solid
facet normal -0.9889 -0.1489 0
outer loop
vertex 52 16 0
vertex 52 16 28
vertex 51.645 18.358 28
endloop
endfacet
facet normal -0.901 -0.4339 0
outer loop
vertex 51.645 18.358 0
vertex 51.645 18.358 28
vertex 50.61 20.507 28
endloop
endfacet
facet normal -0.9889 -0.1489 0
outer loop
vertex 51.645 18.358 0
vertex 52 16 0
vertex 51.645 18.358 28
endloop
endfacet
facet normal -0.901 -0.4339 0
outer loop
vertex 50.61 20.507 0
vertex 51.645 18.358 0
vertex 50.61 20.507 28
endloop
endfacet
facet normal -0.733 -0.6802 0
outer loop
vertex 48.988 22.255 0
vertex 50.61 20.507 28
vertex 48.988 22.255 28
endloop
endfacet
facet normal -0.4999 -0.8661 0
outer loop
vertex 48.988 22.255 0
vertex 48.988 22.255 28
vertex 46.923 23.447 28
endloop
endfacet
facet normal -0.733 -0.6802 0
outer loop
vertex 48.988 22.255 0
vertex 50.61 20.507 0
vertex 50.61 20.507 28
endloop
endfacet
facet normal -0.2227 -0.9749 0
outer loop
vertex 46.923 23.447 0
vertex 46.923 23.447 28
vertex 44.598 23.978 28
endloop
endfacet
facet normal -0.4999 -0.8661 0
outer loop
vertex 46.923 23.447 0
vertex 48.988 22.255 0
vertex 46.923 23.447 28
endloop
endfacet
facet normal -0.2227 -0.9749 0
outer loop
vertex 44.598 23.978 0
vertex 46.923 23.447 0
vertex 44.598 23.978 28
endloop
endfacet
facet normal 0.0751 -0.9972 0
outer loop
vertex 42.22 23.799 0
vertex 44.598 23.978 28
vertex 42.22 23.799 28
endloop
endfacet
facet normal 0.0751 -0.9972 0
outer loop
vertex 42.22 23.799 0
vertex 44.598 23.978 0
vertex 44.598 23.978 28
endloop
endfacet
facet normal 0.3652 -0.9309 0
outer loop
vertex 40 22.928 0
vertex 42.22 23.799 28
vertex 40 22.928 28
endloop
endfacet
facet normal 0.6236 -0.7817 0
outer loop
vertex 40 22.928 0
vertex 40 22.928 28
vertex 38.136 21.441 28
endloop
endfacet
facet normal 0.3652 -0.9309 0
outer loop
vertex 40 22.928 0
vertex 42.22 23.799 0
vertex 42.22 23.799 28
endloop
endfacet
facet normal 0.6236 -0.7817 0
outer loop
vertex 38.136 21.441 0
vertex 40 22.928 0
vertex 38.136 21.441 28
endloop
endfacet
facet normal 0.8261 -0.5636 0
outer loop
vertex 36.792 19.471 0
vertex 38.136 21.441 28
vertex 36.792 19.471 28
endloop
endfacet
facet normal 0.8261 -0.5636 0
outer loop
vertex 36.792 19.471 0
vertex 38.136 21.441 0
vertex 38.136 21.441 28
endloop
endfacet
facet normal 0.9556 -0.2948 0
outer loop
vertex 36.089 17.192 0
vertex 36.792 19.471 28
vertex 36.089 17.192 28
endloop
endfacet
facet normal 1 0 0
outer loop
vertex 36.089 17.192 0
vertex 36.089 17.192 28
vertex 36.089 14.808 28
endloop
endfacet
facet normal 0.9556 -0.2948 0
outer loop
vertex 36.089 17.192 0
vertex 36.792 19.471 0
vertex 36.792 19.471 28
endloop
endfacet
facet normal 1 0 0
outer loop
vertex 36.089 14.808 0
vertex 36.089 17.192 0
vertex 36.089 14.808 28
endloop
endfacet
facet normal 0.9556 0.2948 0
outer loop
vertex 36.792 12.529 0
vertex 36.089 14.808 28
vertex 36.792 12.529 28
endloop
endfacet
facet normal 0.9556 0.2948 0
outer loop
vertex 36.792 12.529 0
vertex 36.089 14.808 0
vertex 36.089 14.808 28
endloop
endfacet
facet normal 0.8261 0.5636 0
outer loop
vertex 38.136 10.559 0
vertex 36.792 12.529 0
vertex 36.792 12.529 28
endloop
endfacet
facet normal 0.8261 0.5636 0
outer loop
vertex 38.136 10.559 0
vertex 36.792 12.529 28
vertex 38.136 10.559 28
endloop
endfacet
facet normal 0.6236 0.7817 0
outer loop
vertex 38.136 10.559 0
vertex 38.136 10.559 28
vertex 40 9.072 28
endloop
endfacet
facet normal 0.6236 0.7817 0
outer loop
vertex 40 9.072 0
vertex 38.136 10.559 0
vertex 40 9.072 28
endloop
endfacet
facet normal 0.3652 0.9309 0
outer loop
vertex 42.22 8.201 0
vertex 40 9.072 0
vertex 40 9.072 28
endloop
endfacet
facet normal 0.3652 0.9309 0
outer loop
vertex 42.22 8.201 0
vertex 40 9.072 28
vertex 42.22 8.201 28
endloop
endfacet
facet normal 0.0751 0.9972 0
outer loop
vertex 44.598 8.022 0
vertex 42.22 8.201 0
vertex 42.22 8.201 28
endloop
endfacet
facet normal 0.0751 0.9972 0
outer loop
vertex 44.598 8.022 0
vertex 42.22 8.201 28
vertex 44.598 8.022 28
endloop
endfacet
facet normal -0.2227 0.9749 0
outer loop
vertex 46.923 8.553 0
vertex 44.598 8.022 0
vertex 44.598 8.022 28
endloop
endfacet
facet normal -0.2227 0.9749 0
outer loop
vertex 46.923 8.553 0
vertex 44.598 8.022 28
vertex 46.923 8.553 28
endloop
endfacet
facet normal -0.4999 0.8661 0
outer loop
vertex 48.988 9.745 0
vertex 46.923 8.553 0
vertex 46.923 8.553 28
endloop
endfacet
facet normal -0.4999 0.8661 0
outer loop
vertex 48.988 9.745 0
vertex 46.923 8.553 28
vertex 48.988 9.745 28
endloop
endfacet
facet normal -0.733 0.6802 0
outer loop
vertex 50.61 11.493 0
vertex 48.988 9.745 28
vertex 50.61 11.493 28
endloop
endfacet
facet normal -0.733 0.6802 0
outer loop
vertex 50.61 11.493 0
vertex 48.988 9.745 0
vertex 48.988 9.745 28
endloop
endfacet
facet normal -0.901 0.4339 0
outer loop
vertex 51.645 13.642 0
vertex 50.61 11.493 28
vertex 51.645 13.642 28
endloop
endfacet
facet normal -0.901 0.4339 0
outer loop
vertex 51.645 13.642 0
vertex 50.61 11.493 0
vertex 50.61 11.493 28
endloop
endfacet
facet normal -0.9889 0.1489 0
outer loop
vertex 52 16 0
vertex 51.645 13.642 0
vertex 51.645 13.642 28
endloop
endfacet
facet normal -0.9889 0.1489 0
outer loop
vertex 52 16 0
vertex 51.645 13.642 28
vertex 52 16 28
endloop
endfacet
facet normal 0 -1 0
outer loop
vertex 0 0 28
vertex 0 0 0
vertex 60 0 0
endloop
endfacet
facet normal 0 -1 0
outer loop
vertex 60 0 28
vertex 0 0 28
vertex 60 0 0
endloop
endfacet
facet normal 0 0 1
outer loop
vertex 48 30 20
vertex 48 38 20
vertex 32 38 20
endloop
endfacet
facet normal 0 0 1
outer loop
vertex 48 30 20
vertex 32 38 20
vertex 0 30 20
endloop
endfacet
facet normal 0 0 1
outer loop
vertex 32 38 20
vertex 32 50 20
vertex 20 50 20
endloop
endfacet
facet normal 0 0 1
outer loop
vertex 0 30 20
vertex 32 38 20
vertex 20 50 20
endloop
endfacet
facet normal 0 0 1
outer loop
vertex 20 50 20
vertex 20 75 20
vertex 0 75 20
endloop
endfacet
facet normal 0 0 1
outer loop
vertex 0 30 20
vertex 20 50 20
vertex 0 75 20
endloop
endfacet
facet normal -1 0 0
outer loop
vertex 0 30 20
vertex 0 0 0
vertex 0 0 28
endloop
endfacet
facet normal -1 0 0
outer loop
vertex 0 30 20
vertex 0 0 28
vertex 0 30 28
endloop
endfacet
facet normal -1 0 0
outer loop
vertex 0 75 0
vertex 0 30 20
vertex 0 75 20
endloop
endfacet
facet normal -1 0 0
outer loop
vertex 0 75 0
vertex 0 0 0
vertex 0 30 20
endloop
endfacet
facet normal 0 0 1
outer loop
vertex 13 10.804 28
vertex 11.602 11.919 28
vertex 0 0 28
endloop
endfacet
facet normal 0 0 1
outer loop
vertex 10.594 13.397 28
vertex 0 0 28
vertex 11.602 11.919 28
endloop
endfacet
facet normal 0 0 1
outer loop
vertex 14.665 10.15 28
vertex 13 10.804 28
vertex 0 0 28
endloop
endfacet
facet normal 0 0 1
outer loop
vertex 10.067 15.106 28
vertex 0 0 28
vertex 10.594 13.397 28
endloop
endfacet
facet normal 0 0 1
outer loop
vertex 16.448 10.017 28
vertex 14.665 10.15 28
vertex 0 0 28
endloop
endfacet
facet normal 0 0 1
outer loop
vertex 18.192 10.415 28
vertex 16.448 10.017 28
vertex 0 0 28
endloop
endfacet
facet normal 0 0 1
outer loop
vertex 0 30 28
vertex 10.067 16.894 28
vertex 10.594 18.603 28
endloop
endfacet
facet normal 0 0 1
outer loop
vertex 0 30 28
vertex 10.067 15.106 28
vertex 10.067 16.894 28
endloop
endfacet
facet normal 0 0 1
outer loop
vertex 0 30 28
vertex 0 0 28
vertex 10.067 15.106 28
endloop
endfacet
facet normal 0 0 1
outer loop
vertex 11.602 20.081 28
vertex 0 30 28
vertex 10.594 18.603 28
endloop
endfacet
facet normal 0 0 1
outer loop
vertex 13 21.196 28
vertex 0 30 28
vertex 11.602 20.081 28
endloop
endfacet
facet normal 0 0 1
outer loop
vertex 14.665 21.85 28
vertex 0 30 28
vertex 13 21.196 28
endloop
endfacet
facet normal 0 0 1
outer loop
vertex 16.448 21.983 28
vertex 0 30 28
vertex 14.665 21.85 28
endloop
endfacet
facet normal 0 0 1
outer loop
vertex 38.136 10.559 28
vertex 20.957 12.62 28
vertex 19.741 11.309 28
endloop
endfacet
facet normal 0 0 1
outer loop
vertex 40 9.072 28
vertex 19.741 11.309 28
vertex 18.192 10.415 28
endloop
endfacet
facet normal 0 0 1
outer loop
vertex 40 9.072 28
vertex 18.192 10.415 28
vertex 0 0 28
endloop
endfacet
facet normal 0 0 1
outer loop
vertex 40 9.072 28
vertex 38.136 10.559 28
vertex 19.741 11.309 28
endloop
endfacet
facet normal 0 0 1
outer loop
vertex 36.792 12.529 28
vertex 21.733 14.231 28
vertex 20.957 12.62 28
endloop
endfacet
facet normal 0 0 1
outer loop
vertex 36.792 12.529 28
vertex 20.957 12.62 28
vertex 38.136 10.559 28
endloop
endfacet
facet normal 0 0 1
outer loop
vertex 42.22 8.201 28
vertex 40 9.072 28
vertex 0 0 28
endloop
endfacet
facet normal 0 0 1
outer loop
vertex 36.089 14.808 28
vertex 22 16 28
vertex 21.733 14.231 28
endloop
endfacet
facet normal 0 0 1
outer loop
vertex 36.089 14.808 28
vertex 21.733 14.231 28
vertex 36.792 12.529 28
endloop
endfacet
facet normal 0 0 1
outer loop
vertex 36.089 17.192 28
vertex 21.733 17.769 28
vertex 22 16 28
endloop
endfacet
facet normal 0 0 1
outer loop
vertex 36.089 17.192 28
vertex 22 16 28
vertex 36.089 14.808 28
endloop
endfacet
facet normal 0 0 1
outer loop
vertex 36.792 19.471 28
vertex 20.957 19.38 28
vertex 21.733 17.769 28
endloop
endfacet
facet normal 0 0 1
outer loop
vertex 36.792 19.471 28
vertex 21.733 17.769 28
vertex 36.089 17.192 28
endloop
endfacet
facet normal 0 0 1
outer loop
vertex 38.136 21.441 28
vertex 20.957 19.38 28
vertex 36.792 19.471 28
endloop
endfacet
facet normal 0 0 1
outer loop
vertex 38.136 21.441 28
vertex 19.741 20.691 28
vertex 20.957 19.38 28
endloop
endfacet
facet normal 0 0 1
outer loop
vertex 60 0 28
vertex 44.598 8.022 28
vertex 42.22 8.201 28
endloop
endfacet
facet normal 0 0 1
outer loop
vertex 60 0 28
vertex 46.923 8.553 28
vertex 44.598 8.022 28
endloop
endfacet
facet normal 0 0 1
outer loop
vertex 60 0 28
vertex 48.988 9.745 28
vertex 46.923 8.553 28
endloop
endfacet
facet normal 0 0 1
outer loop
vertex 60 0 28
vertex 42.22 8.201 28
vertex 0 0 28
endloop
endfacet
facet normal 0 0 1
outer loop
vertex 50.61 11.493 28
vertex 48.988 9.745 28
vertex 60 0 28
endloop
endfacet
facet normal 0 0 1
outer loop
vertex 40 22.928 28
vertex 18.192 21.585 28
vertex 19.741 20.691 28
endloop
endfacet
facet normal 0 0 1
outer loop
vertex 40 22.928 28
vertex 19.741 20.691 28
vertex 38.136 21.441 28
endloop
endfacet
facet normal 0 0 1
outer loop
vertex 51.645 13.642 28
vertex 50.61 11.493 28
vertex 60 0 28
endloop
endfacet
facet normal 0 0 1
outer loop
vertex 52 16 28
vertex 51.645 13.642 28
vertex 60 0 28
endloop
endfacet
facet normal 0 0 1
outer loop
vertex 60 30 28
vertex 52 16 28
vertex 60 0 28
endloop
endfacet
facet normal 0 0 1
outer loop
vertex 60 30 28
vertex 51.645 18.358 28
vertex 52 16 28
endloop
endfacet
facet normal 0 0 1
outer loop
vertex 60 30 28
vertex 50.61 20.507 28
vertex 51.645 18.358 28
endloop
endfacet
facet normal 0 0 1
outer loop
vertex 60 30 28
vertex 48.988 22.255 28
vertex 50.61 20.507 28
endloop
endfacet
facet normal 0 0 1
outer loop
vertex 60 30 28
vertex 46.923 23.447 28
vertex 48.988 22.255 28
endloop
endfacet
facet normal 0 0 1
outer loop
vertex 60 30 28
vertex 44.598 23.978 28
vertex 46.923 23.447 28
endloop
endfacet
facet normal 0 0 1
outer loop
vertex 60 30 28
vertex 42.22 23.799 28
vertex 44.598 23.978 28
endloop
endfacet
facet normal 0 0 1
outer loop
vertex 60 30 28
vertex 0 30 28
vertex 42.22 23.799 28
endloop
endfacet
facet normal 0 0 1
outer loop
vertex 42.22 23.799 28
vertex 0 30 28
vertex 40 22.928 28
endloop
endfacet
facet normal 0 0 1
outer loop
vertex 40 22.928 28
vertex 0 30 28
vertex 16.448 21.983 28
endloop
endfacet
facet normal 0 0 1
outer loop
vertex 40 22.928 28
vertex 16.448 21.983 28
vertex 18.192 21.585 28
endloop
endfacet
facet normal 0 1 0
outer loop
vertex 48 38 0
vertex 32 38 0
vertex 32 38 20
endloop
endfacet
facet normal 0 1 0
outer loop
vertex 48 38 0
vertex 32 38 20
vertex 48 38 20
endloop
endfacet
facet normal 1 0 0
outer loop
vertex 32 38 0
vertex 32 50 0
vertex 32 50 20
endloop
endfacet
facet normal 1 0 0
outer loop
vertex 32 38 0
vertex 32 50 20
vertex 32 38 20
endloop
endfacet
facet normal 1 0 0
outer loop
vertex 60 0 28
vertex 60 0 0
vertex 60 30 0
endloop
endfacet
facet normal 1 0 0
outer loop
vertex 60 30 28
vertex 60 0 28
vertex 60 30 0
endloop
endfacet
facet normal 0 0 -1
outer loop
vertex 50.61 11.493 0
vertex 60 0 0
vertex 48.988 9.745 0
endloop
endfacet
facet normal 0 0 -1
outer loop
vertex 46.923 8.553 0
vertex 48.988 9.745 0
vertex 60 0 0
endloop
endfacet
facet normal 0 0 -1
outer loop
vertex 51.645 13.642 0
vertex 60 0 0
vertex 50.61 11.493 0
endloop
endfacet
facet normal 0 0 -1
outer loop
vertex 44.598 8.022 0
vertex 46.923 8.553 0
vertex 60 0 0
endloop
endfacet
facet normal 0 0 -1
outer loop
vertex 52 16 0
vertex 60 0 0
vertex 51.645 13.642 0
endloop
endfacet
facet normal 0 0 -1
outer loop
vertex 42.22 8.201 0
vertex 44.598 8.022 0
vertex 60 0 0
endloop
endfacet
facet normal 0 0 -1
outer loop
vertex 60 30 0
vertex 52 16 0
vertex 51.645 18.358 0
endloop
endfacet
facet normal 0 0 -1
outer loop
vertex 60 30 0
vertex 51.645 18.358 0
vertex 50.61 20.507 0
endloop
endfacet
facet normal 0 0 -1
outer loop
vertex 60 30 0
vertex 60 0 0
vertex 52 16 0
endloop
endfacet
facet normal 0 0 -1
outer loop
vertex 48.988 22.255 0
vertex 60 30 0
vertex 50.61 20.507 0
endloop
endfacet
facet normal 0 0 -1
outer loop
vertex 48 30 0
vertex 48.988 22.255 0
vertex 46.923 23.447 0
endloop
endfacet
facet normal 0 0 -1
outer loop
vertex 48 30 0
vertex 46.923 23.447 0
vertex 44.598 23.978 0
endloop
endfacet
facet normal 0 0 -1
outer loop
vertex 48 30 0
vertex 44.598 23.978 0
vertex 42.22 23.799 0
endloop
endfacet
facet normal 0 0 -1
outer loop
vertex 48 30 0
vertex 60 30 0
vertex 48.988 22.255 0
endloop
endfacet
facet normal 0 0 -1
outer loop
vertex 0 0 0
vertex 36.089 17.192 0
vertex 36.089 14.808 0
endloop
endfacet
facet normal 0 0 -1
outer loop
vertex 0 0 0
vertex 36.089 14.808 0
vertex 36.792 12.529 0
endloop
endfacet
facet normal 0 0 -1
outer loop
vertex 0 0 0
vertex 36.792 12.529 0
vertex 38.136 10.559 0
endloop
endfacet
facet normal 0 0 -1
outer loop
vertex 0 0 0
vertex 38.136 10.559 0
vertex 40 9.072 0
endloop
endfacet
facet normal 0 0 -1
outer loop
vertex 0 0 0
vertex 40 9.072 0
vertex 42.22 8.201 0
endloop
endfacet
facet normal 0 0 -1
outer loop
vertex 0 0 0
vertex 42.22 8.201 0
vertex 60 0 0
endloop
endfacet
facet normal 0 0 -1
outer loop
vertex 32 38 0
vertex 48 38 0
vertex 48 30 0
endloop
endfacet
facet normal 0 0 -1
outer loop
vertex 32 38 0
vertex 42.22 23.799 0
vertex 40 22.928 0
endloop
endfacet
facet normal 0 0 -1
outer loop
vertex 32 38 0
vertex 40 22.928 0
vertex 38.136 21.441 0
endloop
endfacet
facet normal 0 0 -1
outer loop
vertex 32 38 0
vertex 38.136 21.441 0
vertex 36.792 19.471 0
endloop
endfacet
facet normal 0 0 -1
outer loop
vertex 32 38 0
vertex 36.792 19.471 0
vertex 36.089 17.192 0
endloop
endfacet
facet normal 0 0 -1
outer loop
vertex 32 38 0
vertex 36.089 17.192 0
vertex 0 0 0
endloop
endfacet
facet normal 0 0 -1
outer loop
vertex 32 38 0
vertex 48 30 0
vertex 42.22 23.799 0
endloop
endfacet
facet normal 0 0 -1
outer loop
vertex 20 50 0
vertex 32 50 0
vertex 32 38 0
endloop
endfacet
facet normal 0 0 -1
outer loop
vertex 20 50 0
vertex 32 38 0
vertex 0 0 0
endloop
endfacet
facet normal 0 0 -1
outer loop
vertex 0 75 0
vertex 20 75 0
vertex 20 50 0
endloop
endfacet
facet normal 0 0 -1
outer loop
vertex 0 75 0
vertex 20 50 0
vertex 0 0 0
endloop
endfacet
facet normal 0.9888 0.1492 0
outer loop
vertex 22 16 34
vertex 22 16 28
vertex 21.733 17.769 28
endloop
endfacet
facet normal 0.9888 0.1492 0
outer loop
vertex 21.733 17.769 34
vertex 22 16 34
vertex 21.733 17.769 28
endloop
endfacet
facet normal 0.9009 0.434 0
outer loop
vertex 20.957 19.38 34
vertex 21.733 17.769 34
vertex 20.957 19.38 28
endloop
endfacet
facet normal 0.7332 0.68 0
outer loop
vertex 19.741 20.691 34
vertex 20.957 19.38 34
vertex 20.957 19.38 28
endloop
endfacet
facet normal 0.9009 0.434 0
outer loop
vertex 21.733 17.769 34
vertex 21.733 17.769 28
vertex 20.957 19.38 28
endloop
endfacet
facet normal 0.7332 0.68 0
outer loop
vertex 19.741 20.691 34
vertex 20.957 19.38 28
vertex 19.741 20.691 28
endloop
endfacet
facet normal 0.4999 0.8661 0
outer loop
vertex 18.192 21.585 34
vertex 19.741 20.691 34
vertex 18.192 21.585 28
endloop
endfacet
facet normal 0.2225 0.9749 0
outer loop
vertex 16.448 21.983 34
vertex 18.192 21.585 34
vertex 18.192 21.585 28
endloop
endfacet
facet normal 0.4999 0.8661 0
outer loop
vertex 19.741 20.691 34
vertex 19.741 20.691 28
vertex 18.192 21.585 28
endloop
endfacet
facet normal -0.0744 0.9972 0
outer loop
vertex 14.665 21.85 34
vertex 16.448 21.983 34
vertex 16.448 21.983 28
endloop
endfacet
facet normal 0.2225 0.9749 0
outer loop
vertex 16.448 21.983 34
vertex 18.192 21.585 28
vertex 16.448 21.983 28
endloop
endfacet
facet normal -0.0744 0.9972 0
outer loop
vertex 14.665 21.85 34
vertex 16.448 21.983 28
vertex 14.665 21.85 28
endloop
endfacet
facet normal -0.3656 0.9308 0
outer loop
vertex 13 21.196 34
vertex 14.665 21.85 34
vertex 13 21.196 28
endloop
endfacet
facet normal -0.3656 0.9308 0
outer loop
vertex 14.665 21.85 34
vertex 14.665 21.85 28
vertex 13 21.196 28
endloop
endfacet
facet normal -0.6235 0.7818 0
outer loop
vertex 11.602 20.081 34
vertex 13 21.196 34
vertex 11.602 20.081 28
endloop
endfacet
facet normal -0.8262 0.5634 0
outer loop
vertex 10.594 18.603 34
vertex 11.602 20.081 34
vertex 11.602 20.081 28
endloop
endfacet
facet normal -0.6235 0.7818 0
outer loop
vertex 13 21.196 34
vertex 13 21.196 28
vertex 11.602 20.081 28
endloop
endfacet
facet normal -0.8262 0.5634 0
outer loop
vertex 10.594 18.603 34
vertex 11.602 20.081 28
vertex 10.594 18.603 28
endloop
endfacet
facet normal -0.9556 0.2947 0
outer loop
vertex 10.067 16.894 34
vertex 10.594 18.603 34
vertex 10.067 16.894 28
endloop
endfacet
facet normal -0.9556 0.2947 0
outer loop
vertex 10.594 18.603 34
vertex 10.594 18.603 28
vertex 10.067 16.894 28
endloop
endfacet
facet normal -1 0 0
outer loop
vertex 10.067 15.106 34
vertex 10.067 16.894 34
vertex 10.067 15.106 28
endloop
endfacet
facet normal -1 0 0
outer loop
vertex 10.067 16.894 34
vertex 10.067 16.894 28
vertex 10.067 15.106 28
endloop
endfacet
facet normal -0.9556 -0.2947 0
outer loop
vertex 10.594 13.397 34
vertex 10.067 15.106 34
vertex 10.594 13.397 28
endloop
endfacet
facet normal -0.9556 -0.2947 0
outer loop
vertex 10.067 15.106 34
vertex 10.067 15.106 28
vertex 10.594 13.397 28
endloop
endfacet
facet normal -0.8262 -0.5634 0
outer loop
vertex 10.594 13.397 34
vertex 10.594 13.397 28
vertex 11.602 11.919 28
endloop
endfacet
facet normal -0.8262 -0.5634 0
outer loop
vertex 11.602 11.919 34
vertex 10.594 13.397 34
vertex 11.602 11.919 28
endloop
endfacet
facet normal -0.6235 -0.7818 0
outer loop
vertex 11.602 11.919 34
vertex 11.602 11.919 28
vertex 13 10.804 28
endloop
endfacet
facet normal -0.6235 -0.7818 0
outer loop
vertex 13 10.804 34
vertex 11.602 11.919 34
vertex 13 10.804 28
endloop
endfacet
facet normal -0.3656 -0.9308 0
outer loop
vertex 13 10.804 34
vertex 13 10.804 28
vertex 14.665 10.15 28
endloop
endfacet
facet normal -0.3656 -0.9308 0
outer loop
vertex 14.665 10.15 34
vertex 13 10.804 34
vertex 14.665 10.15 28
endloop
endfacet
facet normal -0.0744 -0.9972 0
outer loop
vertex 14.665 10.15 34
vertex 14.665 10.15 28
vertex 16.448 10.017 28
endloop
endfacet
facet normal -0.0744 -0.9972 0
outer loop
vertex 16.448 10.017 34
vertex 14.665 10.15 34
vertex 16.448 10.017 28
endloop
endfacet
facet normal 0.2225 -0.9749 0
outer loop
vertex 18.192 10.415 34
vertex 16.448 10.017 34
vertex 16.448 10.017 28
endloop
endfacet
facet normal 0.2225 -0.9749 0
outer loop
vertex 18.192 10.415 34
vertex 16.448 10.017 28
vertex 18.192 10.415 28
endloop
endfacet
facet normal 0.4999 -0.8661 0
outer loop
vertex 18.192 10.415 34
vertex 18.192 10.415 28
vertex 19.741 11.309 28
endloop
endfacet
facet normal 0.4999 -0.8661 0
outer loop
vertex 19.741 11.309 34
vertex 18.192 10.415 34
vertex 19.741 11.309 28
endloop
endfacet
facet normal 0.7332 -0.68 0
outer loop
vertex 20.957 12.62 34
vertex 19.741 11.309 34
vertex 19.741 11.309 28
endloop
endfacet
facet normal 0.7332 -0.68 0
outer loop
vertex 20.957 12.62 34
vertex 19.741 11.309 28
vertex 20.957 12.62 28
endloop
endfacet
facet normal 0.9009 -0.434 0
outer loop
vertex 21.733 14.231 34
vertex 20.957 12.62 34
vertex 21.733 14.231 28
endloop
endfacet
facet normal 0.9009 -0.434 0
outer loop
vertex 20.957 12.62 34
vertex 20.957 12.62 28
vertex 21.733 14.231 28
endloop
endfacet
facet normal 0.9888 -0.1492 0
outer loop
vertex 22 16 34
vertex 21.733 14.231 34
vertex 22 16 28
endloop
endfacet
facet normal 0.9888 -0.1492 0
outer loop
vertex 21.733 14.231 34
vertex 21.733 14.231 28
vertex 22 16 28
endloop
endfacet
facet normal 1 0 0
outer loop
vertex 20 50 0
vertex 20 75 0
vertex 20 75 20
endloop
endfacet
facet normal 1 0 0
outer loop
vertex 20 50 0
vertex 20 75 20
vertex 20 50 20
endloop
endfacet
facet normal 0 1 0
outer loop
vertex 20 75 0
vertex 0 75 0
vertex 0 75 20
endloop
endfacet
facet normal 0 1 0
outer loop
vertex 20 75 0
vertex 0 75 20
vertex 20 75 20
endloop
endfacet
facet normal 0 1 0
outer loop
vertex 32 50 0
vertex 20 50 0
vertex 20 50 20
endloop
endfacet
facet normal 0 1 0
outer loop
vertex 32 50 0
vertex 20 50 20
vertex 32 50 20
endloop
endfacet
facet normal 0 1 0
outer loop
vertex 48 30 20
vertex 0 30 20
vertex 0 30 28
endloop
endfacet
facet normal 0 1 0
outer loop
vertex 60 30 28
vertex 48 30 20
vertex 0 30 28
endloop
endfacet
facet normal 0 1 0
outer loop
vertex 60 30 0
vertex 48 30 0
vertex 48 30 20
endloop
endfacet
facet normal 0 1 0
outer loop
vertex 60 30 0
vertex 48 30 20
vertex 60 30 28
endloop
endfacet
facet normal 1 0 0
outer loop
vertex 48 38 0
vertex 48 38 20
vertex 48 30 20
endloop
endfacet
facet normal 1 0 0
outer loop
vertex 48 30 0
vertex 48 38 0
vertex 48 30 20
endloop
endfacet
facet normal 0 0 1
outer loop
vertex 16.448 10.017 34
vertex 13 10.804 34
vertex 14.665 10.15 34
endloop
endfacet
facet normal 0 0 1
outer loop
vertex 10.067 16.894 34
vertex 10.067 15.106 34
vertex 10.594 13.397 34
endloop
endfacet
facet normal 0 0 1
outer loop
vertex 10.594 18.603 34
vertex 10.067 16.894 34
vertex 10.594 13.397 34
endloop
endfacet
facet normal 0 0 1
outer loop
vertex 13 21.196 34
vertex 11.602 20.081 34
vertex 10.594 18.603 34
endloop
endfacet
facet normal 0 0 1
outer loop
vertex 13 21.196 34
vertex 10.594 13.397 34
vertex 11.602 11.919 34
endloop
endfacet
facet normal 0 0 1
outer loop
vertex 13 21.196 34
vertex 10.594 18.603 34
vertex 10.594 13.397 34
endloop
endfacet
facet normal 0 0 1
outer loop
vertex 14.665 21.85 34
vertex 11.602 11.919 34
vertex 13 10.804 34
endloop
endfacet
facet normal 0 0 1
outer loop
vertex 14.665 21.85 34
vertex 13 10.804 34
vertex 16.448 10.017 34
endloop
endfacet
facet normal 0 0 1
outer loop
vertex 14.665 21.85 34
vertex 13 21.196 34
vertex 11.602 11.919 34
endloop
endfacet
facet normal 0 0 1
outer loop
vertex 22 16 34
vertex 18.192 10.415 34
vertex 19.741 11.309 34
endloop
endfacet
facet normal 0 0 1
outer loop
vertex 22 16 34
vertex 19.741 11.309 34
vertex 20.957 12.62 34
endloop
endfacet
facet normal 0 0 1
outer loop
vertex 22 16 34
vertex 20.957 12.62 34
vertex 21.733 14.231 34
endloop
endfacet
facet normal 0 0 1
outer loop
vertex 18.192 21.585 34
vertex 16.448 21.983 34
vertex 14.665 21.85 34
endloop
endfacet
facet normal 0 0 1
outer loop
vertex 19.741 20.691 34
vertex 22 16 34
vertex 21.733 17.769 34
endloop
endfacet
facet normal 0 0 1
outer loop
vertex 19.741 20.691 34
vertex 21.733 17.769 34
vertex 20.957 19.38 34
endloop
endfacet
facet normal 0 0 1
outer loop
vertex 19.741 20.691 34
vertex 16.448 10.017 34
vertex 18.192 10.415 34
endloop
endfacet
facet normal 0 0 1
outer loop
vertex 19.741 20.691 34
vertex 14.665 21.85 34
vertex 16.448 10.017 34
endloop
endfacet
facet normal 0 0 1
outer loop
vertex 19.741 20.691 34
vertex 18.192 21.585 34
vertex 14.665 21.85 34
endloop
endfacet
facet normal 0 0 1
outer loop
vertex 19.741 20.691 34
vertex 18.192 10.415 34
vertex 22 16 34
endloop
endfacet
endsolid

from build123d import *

# Parameters (mm, degrees)
SKETCH1_W           = 60
SKETCH1_H           = 30
SKETCH1_R           = 8
BOSS_EXTRUDE1_DEPTH = 28
BOSS_EXTRUDE2_DEPTH = 20
SKETCH3_R           = 6
BOSS_EXTRUDE3_DEPTH = 6


with BuildPart() as part:
    # Sketch1 → Boss-Extrude1 (new body)
    with BuildSketch(Plane.XY):
        with Locations((30, 15)):
            Rectangle(SKETCH1_W, SKETCH1_H)
        with Locations((44, 16)):
            Circle(SKETCH1_R, mode=Mode.SUBTRACT)
    extrude(amount=BOSS_EXTRUDE1_DEPTH)

    # Sketch2 → Boss-Extrude2 (add)
    with BuildSketch(Plane.XY):
        Polygon((0, 30), (0, 75), (20, 75), (20, 50), (32, 50), (32, 38), (48, 38), (48, 30), align=None)
    extrude(amount=BOSS_EXTRUDE2_DEPTH)

    # Sketch3 → Boss-Extrude3 (add)
    with BuildSketch(Plane.XY.offset(28)):
        with Locations((16, 16)):
            Circle(SKETCH3_R)
    extrude(amount=BOSS_EXTRUDE3_DEPTH)


solid = part.part
